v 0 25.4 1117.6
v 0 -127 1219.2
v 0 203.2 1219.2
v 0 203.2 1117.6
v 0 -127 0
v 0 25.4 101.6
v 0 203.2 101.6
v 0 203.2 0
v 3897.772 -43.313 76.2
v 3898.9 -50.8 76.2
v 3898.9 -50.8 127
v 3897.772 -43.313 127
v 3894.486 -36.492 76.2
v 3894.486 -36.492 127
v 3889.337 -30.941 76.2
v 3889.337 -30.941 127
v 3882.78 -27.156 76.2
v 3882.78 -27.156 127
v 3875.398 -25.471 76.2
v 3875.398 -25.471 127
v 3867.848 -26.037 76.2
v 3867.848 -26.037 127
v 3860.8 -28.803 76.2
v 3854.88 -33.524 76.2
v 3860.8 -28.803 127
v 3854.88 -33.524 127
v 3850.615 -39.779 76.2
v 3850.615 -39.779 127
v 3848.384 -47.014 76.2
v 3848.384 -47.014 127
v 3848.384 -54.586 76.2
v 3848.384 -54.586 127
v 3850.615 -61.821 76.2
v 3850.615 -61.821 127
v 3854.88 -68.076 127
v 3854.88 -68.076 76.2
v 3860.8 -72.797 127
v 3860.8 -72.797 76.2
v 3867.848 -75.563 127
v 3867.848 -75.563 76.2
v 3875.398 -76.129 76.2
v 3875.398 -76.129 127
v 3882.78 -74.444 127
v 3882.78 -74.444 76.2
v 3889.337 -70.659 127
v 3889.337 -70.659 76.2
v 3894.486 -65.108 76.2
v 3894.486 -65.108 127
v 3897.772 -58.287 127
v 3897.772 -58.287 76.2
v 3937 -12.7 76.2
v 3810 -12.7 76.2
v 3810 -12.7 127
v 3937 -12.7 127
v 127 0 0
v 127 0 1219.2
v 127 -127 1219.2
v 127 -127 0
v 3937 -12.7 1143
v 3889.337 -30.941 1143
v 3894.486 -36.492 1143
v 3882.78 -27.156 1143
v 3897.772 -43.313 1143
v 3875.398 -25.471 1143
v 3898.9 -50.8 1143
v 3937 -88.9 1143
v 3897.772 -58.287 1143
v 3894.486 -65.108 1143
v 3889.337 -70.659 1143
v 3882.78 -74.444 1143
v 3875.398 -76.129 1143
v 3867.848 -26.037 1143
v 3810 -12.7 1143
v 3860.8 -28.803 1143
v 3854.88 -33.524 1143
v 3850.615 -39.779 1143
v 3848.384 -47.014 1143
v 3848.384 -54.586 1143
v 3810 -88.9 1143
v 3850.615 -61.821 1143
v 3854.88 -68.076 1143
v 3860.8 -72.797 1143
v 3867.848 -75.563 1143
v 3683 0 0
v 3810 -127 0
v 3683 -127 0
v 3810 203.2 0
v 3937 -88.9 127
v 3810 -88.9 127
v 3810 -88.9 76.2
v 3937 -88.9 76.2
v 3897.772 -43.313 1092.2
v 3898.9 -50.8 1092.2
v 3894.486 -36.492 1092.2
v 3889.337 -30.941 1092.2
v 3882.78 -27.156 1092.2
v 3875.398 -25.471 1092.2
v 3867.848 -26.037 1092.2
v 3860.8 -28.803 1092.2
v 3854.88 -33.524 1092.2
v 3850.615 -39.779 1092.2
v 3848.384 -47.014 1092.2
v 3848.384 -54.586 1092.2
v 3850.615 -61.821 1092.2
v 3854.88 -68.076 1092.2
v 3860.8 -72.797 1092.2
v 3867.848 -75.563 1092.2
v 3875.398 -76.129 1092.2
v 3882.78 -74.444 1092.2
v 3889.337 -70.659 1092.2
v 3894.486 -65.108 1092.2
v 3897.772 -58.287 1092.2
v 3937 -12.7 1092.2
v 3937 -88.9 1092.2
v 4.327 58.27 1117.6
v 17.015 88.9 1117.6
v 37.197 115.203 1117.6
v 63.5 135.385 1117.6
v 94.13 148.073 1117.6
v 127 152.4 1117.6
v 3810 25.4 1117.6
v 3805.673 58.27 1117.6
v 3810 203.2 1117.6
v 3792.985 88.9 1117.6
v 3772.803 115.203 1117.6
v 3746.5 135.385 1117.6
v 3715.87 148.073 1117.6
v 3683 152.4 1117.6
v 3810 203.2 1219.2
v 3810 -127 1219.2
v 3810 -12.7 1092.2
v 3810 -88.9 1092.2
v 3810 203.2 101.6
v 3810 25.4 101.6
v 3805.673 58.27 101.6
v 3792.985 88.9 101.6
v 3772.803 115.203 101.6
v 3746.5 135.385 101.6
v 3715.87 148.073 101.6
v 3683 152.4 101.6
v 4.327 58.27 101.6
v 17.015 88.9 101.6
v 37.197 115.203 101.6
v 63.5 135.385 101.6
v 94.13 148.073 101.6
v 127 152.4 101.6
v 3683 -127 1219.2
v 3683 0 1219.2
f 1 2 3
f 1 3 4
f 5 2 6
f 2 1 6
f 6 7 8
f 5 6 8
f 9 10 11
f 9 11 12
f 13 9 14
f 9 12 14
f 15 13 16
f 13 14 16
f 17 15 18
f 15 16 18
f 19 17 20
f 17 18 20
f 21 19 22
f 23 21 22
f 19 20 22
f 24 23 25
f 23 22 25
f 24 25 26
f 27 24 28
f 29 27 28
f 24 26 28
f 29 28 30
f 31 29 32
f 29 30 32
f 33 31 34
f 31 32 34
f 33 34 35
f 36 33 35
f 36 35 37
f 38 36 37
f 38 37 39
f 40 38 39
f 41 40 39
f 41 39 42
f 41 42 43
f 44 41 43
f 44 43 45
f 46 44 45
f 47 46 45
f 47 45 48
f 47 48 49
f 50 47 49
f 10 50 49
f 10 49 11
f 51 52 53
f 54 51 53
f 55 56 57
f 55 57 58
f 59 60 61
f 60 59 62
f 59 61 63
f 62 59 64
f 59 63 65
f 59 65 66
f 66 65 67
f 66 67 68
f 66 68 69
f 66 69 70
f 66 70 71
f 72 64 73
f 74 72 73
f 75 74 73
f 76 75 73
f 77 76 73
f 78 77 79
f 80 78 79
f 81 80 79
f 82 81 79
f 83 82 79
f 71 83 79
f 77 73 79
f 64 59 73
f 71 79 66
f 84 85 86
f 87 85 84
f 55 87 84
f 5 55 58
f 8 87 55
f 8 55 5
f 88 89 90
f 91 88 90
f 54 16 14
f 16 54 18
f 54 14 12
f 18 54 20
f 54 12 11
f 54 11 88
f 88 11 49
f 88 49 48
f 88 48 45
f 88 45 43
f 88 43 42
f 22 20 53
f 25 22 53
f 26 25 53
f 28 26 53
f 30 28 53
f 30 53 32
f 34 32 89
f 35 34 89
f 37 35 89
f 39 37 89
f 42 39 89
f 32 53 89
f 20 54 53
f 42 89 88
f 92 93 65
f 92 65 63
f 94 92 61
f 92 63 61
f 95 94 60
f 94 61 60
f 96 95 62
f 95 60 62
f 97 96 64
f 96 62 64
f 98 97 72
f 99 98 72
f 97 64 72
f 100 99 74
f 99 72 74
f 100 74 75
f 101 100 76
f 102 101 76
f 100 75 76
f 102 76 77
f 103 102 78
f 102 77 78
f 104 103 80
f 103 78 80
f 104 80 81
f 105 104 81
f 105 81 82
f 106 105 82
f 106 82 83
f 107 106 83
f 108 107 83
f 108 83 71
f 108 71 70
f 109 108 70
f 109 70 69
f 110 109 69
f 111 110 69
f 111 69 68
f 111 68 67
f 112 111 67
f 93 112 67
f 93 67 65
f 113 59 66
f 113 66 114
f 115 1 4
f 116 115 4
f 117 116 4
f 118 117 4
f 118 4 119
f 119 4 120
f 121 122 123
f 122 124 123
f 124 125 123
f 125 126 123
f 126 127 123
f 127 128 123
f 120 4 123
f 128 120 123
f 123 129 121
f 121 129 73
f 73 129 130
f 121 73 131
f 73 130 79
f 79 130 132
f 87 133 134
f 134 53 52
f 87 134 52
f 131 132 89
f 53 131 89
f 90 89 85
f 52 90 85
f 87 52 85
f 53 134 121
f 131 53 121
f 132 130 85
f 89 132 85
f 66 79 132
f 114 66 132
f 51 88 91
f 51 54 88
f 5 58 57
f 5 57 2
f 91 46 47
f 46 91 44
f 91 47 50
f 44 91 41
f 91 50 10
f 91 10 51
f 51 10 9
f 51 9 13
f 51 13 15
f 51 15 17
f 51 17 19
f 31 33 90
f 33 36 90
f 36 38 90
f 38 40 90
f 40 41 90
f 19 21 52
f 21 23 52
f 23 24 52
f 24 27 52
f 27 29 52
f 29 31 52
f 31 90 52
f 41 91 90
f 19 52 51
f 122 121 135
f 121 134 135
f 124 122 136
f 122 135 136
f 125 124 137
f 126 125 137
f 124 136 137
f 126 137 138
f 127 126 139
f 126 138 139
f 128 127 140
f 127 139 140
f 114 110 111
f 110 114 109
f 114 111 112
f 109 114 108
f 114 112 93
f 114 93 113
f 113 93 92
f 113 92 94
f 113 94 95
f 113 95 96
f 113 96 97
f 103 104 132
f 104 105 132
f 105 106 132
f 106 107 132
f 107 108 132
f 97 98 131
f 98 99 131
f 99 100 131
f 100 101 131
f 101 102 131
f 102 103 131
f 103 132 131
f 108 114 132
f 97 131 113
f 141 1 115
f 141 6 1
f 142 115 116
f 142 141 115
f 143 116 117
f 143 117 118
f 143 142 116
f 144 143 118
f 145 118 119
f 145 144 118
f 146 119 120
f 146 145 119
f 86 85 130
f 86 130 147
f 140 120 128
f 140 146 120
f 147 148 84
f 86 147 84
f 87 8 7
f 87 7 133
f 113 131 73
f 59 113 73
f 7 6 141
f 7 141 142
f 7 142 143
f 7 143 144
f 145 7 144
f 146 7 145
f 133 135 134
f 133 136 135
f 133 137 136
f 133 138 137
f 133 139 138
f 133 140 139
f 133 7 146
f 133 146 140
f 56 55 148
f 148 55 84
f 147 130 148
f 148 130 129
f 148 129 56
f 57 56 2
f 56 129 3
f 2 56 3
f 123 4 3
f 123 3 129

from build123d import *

# Parameters (mm, degrees)
SKETCH3_W           = 3810
SKETCH3_H           = 1219.2
BOSS_EXTRUDE2_DEPTH = 203.2
SKETCH4_W           = 3810
SKETCH4_H           = 1016
CUT_EXTRUDE1_DEPTH  = 50.8
SKETCH5_W           = 127
SKETCH5_H           = 1219.2
BOSS_EXTRUDE3_DEPTH = 127
FILLET2_R           = 127
SKETCH6_W           = 25.4
SKETCH6_H           = 38.1
BOSS_EXTRUDE4_DEPTH = 127
SKETCH7_R           = 25.4
CUT_EXTRUDE2_DEPTH  = 1270


with BuildPart() as part:
    # Sketch3 → Boss-Extrude2 (new body)
    with BuildSketch(Plane(origin=(0, 0, 0), x_dir=(1, 0, 0), z_dir=(0, 1, 0))):
        with Locations((1905, -609.6)):
            Rectangle(SKETCH3_W, SKETCH3_H)
    extrude(amount=BOSS_EXTRUDE2_DEPTH)

    # Sketch4 → Cut-Extrude1 (cut)
    with BuildSketch(Plane(origin=(0, 203.2, 0), x_dir=(1, 0, 0), z_dir=(0, 1, 0))):
        with Locations((1905, -609.6)):
            Rectangle(SKETCH4_W, SKETCH4_H)
    extrude(amount=-CUT_EXTRUDE1_DEPTH, mode=Mode.SUBTRACT)

    # Sketch5 → Boss-Extrude3 (add)
    with BuildSketch(Plane(origin=(0, 0, 0), x_dir=(-1, 0, 0), z_dir=(0, -1, 0))):
        with Locations((-63.5, -609.6)):
            Rectangle(SKETCH5_W, SKETCH5_H)
        with Locations((-3746.5, -609.6)):
            Rectangle(SKETCH5_W, SKETCH5_H)
    extrude(amount=BOSS_EXTRUDE3_DEPTH)

    # Fillet2
    fillet2_edges = [part.edges().sort_by_distance(p)[0] for p in [
        (0, 152.4, 609.6),
        (3810, 152.4, 609.6),
    ]]
    fillet(fillet2_edges, radius=FILLET2_R)

    # Sketch6 → Boss-Extrude4 (add)
    with BuildSketch(Plane(origin=(3810, 0, 0), x_dir=(0, 0, -1), z_dir=(1, 0, 0))):
        with Locations((-1104.9, -31.75)):
            Rectangle(SKETCH6_W, SKETCH6_H)
        Polygon((-1117.6, -50.8), (-1117.6, -12.7), (-1143, -12.7), (-1143, -88.9), (-1092.2, -88.9), (-1092.2, -50.8), align=None)
        Polygon((-101.6, -50.8), (-127, -50.8), (-127, -88.9), (-76.2, -88.9), (-76.2, -12.7), (-101.6, -12.7), align=None)
        with Locations((-114.3, -31.75)):
            Rectangle(SKETCH6_W, SKETCH6_H)
    extrude(amount=BOSS_EXTRUDE4_DEPTH)

    # Sketch7 → Cut-Extrude2 (cut)
    with BuildSketch(Plane.XY.offset(1143)):
        with Locations((3873.5, -50.8)):
            Circle(SKETCH7_R)
    extrude(amount=-CUT_EXTRUDE2_DEPTH, mode=Mode.SUBTRACT)


solid = part.part
